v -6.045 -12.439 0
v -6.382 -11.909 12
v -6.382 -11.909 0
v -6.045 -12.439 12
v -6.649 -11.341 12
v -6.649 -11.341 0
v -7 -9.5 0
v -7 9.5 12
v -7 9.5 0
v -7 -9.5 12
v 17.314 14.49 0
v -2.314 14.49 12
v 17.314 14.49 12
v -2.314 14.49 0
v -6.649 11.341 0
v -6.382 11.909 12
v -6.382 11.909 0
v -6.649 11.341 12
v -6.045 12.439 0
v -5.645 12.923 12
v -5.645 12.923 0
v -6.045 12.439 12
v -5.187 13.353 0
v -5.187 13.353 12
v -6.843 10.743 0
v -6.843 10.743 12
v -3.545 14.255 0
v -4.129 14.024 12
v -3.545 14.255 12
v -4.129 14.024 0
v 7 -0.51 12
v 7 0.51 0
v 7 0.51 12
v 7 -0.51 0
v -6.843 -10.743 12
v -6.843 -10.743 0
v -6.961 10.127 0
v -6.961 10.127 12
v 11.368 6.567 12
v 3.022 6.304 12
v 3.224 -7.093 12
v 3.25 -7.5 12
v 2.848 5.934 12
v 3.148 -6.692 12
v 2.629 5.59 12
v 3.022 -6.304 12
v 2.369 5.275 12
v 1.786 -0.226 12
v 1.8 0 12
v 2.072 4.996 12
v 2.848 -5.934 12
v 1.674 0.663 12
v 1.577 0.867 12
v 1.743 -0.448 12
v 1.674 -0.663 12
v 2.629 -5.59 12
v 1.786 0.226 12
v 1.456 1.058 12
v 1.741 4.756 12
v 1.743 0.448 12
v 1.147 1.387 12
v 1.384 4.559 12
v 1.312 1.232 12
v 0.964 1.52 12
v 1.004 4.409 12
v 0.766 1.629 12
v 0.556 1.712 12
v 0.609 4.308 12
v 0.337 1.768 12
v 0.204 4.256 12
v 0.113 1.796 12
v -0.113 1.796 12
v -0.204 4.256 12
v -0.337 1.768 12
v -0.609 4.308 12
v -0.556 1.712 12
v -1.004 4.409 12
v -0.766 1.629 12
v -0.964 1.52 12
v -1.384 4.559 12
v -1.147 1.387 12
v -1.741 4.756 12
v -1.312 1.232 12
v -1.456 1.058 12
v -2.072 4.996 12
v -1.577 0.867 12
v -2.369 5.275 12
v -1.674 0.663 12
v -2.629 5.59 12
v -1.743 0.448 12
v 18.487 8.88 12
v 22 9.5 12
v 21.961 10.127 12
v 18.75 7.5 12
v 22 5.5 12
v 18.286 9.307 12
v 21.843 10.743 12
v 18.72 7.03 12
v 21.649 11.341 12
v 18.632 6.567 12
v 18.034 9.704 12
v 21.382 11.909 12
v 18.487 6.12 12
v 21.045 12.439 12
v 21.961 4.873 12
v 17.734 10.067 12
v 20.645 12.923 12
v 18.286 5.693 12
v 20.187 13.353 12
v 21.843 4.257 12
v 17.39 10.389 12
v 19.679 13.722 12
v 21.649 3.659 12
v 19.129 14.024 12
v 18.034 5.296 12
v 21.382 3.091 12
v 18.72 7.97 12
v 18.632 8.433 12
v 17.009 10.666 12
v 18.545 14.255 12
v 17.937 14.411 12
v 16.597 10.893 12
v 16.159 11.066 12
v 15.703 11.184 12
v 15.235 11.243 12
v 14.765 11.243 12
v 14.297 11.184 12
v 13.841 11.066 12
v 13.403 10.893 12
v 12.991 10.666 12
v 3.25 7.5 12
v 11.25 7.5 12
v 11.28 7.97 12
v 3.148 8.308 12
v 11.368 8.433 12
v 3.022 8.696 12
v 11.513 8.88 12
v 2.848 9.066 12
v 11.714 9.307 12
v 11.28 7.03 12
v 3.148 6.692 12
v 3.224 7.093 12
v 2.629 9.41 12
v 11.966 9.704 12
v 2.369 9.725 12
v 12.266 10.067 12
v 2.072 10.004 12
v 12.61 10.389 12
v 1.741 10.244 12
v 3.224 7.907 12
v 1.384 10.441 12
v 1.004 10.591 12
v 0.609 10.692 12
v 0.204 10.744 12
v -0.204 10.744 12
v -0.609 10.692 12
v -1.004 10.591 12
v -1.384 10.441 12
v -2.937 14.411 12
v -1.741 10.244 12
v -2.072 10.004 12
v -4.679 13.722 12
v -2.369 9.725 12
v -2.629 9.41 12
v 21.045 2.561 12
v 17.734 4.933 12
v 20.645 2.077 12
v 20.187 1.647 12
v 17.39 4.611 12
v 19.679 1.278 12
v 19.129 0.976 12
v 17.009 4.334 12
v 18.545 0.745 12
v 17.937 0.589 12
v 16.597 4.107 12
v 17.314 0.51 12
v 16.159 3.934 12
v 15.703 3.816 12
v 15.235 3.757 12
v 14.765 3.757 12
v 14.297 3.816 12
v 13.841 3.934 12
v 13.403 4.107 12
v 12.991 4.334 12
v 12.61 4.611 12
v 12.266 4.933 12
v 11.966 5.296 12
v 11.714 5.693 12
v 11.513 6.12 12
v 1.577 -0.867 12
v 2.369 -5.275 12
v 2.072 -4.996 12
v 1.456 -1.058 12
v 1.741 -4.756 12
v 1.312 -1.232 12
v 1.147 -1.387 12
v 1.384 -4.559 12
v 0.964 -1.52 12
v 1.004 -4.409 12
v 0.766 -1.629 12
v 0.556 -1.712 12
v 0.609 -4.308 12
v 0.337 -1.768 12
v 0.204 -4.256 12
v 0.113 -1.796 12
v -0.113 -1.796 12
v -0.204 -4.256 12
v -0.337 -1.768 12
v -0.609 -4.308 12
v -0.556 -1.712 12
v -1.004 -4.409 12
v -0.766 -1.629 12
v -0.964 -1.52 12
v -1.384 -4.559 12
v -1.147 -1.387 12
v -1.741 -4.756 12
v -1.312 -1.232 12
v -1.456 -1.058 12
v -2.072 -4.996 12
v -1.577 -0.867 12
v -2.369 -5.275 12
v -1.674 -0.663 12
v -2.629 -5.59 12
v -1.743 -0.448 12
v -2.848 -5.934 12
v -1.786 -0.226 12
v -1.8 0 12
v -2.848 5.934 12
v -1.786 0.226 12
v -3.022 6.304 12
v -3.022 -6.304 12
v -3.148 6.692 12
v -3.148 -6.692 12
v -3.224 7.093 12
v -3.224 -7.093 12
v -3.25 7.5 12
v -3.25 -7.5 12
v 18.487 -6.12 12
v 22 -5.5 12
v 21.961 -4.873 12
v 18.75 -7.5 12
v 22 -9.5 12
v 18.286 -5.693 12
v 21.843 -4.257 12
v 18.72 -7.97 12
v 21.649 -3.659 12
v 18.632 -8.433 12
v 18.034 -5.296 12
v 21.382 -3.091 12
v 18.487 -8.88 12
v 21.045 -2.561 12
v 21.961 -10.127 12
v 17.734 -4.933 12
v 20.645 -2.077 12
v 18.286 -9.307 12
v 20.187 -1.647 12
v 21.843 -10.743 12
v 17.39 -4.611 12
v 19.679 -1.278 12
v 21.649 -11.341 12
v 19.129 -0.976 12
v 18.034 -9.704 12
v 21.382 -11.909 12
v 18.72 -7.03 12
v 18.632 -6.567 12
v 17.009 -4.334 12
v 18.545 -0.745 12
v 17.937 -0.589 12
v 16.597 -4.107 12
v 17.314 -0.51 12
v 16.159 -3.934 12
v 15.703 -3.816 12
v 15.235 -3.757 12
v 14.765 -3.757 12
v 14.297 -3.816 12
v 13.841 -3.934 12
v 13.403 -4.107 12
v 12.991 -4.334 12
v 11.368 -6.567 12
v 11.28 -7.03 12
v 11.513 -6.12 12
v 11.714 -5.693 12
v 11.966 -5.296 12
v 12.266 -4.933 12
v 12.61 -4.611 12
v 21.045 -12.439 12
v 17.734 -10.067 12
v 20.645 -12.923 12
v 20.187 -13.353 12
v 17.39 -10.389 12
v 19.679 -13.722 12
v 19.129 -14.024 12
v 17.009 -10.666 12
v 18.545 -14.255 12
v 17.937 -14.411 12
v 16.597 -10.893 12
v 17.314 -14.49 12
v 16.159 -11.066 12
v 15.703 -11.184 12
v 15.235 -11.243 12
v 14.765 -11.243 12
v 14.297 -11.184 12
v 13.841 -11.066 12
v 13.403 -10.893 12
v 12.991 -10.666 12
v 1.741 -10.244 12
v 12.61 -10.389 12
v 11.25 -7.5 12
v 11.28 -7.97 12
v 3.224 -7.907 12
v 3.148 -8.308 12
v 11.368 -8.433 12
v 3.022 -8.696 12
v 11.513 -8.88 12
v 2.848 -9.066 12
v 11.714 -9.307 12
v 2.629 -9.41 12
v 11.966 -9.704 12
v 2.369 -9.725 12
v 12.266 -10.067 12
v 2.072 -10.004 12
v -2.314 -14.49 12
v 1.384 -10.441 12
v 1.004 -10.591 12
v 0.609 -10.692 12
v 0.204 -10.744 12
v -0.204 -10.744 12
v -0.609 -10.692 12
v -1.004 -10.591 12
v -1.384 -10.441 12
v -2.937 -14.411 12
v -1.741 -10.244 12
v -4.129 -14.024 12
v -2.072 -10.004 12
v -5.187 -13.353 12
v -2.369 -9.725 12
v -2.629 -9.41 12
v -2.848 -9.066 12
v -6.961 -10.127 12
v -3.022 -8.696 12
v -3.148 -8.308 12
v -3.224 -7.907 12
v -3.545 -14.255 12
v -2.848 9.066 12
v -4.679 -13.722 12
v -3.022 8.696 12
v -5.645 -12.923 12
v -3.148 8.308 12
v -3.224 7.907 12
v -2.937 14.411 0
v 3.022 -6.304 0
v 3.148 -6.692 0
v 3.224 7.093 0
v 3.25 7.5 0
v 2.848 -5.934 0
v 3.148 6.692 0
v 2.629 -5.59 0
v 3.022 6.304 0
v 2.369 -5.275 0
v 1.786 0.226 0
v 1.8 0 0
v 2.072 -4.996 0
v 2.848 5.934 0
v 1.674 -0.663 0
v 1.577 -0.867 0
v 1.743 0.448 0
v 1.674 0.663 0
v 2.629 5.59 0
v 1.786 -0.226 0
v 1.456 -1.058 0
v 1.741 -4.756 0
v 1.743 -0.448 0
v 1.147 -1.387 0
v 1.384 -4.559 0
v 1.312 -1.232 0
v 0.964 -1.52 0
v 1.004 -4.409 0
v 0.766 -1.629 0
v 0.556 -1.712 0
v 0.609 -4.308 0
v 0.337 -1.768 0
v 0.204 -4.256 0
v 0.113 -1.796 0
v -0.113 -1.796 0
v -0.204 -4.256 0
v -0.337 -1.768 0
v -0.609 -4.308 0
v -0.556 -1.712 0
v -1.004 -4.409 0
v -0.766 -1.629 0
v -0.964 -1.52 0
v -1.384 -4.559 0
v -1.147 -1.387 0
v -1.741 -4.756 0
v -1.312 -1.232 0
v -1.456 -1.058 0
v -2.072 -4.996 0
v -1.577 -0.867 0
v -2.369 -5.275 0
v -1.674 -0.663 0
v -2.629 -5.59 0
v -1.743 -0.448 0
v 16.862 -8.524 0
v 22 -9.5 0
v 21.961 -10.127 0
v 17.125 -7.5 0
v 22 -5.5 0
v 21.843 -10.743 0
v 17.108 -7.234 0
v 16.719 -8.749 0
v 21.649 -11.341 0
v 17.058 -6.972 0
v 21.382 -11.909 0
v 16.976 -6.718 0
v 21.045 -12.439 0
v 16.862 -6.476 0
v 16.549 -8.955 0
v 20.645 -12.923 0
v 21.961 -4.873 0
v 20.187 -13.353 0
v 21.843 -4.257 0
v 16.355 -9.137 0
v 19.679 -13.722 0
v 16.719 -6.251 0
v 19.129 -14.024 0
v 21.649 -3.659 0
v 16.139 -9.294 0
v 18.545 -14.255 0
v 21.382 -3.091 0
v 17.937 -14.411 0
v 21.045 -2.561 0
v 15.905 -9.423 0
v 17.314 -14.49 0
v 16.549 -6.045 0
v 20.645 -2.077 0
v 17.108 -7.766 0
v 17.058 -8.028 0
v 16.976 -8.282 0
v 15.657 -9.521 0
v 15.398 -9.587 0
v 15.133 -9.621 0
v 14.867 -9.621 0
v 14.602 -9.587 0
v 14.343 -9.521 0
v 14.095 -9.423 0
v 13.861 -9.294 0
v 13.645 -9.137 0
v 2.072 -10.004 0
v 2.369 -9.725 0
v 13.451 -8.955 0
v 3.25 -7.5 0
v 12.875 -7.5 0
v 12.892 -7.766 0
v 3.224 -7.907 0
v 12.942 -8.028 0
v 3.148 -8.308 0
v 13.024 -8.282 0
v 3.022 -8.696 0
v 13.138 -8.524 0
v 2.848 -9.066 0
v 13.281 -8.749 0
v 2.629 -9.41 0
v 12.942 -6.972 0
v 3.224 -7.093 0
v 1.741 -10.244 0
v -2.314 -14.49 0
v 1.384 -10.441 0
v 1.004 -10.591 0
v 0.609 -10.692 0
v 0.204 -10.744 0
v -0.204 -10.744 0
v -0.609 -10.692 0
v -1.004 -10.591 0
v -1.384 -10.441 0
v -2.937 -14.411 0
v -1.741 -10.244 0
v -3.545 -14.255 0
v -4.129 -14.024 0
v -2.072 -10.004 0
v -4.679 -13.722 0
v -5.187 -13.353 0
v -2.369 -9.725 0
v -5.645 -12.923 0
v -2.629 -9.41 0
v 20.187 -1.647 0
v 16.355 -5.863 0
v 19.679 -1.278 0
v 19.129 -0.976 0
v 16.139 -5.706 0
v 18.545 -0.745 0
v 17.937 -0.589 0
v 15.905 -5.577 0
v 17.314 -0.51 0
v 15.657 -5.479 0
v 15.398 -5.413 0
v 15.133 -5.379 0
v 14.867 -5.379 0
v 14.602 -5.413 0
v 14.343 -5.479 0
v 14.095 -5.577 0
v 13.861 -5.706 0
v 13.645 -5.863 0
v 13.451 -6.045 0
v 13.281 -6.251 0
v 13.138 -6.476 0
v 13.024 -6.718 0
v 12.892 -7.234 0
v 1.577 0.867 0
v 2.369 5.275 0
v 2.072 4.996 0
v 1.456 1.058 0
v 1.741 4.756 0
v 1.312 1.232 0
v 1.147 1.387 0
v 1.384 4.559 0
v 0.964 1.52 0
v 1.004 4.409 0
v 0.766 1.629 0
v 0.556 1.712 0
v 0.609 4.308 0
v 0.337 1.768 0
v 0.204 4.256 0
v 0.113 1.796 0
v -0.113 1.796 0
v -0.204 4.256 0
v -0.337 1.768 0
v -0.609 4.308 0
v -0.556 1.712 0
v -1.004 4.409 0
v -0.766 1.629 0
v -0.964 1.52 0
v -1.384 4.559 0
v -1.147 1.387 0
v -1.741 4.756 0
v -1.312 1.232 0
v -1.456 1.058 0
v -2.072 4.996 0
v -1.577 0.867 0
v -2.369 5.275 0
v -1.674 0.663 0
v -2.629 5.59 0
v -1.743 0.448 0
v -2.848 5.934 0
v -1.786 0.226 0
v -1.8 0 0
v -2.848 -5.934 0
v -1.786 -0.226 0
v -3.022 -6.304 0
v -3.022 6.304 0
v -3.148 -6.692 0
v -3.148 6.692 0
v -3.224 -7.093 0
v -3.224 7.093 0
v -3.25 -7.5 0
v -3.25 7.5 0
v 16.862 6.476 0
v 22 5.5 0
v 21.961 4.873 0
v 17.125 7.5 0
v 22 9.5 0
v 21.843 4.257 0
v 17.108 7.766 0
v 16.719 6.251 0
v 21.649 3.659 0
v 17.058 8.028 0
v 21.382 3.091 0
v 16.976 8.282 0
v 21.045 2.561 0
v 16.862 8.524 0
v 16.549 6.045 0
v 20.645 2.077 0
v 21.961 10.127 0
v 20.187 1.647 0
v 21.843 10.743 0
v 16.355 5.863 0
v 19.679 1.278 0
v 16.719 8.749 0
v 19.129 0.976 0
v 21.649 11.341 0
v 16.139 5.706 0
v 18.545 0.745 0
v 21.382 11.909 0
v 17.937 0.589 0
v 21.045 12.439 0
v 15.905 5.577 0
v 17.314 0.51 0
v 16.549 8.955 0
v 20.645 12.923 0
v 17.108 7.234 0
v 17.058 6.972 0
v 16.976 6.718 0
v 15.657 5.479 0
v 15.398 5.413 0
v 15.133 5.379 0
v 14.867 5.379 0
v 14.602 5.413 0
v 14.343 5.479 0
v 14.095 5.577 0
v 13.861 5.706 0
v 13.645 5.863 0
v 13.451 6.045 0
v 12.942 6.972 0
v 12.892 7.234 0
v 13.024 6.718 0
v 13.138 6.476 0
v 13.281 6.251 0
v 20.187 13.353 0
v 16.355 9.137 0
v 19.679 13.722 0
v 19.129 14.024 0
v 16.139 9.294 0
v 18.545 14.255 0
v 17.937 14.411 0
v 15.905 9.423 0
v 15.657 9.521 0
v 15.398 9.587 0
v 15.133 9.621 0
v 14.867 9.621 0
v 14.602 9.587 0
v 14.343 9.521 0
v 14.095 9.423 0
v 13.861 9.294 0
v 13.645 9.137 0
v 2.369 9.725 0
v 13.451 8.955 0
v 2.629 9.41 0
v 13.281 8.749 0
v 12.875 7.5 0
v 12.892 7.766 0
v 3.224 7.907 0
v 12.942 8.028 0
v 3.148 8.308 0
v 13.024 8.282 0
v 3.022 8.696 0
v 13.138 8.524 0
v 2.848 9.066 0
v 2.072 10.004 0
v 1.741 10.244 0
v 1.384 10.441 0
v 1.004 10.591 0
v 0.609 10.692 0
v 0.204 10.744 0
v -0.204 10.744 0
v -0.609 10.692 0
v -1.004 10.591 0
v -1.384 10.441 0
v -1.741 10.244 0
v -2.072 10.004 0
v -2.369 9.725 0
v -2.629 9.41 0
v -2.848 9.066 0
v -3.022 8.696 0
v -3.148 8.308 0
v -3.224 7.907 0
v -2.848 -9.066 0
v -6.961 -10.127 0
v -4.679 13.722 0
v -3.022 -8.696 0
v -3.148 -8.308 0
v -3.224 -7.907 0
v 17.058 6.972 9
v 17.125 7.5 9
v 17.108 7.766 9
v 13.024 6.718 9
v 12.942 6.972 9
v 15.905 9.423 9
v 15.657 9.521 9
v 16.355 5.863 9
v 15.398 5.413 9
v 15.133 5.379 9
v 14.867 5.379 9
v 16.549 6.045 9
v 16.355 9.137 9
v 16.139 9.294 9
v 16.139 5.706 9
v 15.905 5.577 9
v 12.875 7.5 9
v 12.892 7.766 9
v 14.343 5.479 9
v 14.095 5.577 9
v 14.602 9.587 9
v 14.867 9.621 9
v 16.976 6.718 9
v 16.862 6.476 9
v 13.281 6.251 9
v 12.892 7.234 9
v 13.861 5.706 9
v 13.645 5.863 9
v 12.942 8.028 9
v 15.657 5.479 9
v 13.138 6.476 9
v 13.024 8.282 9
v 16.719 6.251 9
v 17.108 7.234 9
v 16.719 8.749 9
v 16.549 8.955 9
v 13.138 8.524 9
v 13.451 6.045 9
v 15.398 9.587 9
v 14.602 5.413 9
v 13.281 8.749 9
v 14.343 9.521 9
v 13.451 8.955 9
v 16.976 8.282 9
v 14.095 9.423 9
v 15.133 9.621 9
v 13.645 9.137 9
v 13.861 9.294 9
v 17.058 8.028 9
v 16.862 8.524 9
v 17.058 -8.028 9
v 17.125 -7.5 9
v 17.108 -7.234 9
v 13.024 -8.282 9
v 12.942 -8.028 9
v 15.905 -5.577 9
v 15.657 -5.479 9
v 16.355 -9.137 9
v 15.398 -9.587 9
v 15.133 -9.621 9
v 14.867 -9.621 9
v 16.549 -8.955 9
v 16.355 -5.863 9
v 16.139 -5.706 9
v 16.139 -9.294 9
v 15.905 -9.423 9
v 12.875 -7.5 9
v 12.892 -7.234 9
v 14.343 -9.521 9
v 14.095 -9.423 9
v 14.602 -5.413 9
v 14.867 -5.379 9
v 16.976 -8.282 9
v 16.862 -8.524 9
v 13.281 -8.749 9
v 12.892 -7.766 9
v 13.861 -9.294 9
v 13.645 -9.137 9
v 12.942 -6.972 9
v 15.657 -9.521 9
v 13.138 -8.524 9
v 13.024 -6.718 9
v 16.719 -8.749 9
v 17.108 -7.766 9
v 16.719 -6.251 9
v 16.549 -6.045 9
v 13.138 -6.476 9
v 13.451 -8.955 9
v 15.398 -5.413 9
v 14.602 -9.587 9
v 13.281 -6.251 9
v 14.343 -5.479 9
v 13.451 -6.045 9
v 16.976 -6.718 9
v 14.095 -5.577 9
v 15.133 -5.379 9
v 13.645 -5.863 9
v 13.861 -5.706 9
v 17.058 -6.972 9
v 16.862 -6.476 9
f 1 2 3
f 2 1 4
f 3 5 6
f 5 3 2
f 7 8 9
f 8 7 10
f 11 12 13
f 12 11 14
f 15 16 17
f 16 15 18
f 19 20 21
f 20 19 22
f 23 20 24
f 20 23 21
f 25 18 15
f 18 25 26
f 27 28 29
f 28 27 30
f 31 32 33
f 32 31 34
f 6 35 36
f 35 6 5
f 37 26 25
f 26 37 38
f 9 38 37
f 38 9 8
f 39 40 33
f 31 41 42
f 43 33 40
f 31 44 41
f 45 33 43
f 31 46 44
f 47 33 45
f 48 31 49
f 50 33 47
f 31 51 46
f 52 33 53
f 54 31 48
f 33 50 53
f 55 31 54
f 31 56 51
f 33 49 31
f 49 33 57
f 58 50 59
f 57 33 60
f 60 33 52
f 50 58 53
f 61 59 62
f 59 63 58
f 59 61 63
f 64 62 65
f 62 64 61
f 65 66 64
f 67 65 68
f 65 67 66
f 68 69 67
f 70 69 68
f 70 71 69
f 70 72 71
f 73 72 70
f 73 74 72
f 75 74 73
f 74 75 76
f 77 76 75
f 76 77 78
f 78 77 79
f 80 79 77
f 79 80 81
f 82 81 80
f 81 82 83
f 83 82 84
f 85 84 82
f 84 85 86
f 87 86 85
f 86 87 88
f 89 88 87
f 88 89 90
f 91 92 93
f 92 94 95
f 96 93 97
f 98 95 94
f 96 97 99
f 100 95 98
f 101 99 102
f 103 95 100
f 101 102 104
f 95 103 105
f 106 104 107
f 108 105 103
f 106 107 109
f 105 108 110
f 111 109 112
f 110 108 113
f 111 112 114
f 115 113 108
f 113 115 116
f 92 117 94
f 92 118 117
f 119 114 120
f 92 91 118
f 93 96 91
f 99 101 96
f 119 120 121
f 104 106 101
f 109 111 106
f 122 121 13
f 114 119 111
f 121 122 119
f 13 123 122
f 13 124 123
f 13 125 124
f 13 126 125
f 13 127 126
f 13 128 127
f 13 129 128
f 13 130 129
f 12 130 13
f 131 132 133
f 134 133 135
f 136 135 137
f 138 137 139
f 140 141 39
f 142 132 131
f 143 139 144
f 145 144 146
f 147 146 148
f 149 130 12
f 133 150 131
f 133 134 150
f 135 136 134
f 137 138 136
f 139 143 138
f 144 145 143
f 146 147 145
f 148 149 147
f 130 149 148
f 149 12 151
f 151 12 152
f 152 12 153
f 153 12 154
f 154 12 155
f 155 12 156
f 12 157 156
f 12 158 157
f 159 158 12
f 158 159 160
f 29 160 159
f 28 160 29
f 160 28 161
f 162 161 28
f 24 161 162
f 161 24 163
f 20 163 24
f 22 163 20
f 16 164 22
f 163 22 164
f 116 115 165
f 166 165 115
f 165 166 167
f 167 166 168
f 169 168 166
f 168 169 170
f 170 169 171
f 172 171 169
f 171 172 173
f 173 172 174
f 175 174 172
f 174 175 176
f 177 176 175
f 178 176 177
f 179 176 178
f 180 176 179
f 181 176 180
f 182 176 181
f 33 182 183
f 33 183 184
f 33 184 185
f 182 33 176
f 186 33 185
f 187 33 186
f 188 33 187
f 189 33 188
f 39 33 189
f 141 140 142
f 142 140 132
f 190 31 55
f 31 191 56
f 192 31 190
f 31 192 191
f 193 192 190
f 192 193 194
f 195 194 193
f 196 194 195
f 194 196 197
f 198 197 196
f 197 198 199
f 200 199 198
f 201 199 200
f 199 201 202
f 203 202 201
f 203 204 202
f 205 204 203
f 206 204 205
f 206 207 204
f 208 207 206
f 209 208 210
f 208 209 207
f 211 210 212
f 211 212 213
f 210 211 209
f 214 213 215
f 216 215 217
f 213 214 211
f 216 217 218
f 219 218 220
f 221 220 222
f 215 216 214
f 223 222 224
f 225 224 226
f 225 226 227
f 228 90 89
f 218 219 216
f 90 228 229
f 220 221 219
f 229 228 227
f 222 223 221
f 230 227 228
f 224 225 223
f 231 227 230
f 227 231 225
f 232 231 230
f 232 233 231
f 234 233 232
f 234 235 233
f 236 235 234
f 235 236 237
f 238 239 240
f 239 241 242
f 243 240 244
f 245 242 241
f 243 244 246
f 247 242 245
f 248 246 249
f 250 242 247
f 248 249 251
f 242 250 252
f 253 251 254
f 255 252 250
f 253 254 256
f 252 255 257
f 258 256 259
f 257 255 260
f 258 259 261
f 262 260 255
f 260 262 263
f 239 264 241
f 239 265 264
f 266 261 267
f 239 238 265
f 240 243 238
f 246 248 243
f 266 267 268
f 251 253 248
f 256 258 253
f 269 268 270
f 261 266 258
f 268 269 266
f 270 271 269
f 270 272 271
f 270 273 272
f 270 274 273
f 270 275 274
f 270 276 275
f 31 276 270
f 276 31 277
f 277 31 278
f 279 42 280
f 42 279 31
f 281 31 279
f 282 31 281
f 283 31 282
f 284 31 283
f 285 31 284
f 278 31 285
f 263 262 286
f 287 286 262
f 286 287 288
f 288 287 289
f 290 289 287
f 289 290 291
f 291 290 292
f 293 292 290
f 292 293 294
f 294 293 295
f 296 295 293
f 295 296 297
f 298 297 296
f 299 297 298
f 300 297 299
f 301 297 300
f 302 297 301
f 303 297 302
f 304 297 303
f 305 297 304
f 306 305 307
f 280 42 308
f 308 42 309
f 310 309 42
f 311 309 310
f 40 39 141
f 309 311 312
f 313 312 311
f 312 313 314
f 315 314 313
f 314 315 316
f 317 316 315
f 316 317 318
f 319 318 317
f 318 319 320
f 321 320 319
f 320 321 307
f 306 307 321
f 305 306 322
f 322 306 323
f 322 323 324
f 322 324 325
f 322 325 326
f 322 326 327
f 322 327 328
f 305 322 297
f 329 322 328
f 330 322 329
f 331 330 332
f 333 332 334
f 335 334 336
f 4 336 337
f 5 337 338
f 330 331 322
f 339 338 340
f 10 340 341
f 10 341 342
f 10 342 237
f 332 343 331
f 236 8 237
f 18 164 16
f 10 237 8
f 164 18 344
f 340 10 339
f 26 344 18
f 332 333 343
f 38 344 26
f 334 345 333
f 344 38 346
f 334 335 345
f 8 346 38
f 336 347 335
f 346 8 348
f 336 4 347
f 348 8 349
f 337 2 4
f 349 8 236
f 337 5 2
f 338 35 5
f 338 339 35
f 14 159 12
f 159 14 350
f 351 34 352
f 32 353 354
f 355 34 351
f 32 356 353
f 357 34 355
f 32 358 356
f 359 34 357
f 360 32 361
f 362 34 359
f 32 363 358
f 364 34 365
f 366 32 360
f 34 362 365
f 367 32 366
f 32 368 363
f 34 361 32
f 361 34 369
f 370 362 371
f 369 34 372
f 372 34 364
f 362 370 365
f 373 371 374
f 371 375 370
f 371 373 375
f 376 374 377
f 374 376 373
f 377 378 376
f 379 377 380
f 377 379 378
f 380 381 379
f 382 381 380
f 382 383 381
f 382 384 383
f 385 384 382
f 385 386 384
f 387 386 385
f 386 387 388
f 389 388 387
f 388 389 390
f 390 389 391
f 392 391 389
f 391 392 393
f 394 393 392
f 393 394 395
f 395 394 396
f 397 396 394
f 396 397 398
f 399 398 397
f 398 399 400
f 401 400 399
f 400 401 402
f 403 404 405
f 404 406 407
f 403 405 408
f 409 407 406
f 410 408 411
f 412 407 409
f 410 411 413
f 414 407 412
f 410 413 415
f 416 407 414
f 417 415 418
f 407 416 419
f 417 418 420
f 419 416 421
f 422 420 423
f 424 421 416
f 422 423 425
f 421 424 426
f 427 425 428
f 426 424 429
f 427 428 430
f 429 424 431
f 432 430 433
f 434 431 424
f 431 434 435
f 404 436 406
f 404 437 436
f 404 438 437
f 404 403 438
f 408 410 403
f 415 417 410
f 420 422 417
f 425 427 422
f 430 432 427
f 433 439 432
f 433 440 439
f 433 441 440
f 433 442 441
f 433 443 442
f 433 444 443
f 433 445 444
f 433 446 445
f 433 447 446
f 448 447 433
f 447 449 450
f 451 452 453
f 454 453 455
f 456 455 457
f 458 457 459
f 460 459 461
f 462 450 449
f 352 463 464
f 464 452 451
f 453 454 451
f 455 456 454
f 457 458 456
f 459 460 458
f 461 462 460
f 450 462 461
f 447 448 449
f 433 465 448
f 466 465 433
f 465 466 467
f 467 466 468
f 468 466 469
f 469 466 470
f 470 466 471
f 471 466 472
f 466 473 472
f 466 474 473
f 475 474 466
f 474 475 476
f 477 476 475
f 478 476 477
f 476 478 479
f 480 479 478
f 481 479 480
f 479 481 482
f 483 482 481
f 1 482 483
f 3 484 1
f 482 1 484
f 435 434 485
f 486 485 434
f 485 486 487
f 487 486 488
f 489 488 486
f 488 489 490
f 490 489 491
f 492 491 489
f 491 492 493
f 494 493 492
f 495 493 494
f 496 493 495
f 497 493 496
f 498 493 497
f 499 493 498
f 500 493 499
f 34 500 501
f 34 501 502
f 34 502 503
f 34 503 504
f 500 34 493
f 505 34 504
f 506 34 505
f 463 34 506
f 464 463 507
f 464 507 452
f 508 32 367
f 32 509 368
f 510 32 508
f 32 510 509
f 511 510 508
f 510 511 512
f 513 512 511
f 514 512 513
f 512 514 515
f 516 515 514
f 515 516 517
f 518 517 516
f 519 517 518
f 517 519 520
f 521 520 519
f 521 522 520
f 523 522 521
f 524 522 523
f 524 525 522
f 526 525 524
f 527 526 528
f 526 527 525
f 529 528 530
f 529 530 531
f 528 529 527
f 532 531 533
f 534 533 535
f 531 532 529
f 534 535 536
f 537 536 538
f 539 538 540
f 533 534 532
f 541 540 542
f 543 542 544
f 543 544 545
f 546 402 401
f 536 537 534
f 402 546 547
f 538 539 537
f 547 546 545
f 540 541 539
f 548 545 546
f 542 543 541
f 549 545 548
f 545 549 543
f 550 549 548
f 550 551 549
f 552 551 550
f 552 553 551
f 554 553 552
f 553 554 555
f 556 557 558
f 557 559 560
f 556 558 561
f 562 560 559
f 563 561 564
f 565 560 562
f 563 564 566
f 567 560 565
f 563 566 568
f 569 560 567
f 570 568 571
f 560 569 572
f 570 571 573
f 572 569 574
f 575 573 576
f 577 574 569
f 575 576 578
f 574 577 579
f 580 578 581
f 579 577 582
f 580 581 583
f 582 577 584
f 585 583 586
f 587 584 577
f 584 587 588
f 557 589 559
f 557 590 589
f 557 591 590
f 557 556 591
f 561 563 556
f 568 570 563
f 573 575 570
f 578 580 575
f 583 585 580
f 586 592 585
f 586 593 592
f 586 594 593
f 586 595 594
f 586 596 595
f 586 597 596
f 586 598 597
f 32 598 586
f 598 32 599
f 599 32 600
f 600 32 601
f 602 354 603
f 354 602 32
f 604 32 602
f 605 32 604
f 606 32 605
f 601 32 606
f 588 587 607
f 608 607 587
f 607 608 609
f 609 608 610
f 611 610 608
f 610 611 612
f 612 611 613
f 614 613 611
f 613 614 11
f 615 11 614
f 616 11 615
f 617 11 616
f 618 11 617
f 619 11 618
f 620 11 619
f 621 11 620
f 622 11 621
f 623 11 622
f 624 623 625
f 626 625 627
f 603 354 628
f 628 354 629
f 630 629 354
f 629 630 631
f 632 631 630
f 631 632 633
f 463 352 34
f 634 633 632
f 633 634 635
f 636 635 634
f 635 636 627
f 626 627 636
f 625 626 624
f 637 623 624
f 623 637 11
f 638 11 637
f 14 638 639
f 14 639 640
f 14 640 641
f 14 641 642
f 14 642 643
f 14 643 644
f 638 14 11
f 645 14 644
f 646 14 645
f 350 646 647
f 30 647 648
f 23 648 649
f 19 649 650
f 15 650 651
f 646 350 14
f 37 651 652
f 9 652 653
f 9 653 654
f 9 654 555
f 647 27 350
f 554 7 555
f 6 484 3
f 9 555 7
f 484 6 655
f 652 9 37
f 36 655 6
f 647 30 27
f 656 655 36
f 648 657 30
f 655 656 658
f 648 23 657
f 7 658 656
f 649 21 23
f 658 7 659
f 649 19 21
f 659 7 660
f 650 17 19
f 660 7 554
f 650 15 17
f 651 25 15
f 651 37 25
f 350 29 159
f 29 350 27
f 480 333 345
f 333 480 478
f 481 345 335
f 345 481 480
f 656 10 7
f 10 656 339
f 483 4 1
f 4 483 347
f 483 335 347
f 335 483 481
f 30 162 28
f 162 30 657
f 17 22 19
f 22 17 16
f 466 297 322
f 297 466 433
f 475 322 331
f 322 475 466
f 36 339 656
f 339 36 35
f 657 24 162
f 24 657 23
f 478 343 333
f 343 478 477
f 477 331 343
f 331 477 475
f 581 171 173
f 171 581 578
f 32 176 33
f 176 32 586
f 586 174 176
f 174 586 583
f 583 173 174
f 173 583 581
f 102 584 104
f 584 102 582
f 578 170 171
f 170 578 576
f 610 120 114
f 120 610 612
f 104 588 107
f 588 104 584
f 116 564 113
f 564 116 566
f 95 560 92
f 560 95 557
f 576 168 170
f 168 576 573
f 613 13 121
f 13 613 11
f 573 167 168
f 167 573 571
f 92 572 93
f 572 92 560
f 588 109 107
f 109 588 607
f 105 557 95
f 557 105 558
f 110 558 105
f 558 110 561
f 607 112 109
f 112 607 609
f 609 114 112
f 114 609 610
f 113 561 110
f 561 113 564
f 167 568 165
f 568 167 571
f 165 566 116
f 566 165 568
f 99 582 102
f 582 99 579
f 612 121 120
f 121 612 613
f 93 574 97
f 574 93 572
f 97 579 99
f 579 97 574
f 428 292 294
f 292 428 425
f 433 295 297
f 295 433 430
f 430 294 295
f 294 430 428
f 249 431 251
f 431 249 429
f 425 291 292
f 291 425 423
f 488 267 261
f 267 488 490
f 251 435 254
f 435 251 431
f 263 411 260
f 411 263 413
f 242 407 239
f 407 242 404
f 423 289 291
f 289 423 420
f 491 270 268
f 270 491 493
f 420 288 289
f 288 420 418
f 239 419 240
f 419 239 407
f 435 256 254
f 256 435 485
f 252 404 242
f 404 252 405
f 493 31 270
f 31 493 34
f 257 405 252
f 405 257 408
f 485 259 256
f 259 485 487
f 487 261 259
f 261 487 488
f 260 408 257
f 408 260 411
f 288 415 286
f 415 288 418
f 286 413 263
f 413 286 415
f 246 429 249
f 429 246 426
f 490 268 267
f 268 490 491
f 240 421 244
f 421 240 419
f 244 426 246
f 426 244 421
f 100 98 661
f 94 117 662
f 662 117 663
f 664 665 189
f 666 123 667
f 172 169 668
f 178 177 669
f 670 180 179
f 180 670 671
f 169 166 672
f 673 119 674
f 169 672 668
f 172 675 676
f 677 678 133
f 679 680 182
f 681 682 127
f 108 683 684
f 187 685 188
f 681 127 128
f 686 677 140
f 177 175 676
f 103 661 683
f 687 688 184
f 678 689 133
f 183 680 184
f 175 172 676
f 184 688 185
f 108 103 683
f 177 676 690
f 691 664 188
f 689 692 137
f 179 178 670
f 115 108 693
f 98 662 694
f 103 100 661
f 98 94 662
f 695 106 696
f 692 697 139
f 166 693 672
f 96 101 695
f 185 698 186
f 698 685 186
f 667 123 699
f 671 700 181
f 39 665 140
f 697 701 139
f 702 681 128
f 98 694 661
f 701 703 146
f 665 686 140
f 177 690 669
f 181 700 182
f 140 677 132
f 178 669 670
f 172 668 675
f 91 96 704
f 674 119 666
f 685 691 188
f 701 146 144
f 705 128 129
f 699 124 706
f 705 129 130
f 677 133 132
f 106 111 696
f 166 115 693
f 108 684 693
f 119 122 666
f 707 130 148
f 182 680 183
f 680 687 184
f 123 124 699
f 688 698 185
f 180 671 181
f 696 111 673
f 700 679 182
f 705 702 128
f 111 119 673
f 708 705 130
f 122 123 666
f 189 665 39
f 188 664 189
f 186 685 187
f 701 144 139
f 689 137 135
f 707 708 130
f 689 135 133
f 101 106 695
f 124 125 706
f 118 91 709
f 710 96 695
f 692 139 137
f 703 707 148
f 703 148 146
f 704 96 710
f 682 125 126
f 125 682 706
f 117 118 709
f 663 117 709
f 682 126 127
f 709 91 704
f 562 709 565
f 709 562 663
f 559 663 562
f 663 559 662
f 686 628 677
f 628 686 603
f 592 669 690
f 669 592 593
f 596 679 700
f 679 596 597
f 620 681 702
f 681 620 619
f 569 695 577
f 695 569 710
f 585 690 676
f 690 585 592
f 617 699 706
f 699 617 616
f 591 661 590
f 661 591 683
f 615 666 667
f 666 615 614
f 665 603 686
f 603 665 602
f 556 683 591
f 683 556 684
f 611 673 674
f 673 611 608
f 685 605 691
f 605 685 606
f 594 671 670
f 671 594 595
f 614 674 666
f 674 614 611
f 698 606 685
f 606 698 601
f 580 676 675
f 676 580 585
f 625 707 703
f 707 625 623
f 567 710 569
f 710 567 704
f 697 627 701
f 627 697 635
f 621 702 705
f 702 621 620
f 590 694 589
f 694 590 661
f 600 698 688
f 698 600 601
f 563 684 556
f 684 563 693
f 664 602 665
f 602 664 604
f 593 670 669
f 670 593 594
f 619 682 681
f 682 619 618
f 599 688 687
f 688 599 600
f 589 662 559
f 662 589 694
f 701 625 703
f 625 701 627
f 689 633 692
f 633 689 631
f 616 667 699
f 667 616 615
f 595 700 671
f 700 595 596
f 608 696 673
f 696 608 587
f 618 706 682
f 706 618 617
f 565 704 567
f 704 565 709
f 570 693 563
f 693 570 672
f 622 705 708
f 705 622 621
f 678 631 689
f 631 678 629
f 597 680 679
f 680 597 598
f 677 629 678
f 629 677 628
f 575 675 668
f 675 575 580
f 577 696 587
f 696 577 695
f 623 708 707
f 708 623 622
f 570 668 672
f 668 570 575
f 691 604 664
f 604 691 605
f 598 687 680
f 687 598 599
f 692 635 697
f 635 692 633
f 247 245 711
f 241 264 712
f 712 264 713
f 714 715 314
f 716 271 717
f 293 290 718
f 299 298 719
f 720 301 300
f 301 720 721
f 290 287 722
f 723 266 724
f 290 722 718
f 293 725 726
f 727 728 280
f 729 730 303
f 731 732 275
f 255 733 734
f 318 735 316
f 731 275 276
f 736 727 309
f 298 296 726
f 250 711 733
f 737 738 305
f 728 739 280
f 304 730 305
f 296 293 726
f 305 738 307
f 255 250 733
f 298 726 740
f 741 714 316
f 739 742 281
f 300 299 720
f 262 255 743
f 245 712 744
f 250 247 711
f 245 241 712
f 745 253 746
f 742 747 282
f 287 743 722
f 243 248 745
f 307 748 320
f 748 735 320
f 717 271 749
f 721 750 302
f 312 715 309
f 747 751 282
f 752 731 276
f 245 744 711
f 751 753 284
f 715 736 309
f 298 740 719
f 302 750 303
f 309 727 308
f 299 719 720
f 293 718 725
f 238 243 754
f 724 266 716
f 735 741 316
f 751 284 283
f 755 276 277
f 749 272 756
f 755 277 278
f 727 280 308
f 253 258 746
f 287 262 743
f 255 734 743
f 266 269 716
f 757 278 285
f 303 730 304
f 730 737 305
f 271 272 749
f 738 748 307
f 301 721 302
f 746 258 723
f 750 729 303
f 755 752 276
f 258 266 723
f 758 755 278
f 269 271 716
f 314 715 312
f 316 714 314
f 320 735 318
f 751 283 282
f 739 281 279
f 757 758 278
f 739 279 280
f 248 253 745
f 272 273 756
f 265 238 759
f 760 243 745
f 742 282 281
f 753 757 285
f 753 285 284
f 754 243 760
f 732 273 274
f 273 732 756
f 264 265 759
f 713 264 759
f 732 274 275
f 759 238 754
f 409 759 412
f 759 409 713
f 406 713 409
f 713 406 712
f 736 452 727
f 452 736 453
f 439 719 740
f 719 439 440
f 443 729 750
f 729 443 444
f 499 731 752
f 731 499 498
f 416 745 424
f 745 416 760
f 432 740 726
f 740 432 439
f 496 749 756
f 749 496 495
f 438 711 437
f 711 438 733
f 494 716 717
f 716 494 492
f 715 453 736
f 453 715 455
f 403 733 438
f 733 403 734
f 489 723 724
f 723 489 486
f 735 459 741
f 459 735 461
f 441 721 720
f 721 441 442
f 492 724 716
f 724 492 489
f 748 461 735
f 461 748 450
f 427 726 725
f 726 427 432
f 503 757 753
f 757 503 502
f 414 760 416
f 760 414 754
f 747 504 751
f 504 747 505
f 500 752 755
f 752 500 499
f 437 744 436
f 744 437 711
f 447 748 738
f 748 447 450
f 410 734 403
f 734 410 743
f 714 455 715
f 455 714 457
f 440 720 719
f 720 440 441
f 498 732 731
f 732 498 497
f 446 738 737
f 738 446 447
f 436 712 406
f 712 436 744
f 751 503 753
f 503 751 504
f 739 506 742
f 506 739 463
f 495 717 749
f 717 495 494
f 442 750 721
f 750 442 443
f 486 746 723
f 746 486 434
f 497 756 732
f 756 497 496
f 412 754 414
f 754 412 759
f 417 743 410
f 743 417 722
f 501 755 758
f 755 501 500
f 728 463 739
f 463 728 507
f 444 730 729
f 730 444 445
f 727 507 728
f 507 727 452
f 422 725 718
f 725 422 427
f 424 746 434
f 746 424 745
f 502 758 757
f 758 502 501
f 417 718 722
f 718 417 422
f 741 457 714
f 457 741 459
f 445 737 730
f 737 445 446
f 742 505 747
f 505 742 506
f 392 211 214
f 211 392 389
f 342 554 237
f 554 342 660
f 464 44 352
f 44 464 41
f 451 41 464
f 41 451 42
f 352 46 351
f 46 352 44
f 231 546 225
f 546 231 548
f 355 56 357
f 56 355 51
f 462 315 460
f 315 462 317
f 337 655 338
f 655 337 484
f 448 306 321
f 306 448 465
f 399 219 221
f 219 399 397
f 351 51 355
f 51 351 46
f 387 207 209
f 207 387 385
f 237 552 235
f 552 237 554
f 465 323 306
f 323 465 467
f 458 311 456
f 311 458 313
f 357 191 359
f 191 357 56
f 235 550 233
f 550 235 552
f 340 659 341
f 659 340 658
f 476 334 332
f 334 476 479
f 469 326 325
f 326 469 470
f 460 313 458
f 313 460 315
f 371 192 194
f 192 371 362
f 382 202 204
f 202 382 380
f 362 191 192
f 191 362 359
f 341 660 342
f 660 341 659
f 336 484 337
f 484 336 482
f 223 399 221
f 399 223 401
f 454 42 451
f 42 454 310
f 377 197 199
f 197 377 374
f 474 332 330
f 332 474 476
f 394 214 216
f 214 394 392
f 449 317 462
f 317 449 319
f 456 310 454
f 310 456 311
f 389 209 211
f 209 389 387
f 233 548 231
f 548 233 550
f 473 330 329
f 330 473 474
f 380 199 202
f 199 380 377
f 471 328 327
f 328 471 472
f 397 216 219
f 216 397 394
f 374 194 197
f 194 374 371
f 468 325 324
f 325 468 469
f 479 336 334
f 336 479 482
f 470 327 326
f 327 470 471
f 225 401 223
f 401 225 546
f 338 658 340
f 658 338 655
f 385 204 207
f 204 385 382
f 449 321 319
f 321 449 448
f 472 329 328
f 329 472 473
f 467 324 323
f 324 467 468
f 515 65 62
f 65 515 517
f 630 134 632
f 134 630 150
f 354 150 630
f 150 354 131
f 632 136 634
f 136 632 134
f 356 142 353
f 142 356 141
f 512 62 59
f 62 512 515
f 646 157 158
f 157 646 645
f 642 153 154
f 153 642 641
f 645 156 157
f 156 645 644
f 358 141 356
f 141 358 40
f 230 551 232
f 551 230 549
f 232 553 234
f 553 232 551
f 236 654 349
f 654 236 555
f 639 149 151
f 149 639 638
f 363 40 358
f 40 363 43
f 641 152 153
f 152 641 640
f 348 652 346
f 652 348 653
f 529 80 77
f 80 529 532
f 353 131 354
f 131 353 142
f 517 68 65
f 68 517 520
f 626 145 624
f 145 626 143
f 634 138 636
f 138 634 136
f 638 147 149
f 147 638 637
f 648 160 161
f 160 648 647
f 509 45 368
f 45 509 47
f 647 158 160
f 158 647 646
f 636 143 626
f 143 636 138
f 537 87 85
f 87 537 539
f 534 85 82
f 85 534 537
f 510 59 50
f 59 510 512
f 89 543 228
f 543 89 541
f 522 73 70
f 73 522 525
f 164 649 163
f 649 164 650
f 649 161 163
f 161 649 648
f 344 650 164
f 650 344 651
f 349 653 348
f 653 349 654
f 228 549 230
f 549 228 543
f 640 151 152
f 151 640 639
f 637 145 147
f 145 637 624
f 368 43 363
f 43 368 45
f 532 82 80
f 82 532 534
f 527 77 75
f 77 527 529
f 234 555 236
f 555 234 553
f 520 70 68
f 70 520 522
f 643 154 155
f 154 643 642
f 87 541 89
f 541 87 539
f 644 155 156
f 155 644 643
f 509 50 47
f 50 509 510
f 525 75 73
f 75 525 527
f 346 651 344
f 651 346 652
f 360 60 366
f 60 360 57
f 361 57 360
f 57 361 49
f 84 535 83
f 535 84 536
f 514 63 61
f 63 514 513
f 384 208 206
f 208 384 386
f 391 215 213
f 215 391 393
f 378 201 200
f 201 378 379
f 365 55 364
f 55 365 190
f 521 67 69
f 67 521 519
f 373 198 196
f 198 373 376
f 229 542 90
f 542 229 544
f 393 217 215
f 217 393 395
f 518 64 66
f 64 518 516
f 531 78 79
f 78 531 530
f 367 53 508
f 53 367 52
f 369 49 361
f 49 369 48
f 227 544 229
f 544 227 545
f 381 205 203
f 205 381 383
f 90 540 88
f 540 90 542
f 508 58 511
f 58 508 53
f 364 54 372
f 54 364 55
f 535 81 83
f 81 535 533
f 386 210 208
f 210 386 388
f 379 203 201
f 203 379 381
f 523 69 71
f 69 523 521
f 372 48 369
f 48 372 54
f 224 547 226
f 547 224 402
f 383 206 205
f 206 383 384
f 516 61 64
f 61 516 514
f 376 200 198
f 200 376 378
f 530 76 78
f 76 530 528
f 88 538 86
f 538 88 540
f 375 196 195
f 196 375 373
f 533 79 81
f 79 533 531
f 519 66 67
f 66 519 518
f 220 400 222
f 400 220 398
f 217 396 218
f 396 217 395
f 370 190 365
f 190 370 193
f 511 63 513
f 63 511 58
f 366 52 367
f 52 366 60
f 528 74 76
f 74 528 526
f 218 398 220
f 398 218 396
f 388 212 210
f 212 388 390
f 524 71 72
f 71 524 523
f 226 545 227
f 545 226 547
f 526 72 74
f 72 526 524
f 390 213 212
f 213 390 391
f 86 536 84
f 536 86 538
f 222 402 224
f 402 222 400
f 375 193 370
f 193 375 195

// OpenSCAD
$fn = 50;


difference() {
	union() {
		hull() {
			translate(v = [-2.0000000000, 9.5000000000, 0]) {
				cylinder(h = 12, r = 5);
			}
			translate(v = [2.0000000000, 9.5000000000, 0]) {
				cylinder(h = 12, r = 5);
			}
			translate(v = [-2.0000000000, -9.5000000000, 0]) {
				cylinder(h = 12, r = 5);
			}
			translate(v = [2.0000000000, -9.5000000000, 0]) {
				cylinder(h = 12, r = 5);
			}
		}
		translate(v = [7.5000000000, 7.5000000000, 0]) {
			hull() {
				translate(v = [-9.5000000000, 2.0000000000, 0]) {
					cylinder(h = 12, r = 5);
				}
				translate(v = [9.5000000000, 2.0000000000, 0]) {
					cylinder(h = 12, r = 5);
				}
				translate(v = [-9.5000000000, -2.0000000000, 0]) {
					cylinder(h = 12, r = 5);
				}
				translate(v = [9.5000000000, -2.0000000000, 0]) {
					cylinder(h = 12, r = 5);
				}
			}
		}
		translate(v = [7.5000000000, -7.5000000000, 0]) {
			hull() {
				translate(v = [-9.5000000000, 2.0000000000, 0]) {
					cylinder(h = 12, r = 5);
				}
				translate(v = [9.5000000000, 2.0000000000, 0]) {
					cylinder(h = 12, r = 5);
				}
				translate(v = [-9.5000000000, -2.0000000000, 0]) {
					cylinder(h = 12, r = 5);
				}
				translate(v = [9.5000000000, -2.0000000000, 0]) {
					cylinder(h = 12, r = 5);
				}
			}
		}
	}
	union() {
		translate(v = [15.0000000000, 7.5000000000, 12]) {
			rotate(a = [0, 0, 0]) {
				difference() {
					union() {
						#translate(v = [0, 0, -12.0000000000]) {
							cylinder(h = 12, r = 2.0000000000);
						}
						#translate(v = [0, 0, -3]) {
							cylinder(h = 3, r1 = 2.1250000000, r2 = 3.7500000000);
						}
						#translate(v = [0, 0, -12.0000000000]) {
							cylinder(h = 12, r = 2.1250000000);
						}
						#translate(v = [0, 0, -12.0000000000]) {
							cylinder(h = 12, r = 2.0000000000);
						}
					}
					union();
				}
			}
		}
		translate(v = [15.0000000000, -7.5000000000, 12]) {
			rotate(a = [0, 0, 0]) {
				difference() {
					union() {
						#translate(v = [0, 0, -12.0000000000]) {
							cylinder(h = 12, r = 2.0000000000);
						}
						#translate(v = [0, 0, -3]) {
							cylinder(h = 3, r1 = 2.1250000000, r2 = 3.7500000000);
						}
						#translate(v = [0, 0, -12.0000000000]) {
							cylinder(h = 12, r = 2.1250000000);
						}
						#translate(v = [0, 0, -12.0000000000]) {
							cylinder(h = 12, r = 2.0000000000);
						}
					}
					union();
				}
			}
		}
		translate(v = [0.0000000000, -7.5000000000, 0]) {
			translate(v = [0, 0, -100]) {
				cylinder(h = 200, r = 3.2500000000);
			}
		}
		translate(v = [0.0000000000, 7.5000000000, 0]) {
			translate(v = [0, 0, -100]) {
				cylinder(h = 200, r = 3.2500000000);
			}
		}
		translate(v = [0.0000000000, -7.5000000000, 0]) {
			translate(v = [0, 0, -100]) {
				cylinder(h = 200, r = 1.8000000000);
			}
		}
		translate(v = [0, 0, -100]) {
			cylinder(h = 200, r = 1.8000000000);
		}
		translate(v = [0.0000000000, 7.5000000000, 0]) {
			translate(v = [0, 0, -100]) {
				cylinder(h = 200, r = 1.8000000000);
			}
		}
	}
}
